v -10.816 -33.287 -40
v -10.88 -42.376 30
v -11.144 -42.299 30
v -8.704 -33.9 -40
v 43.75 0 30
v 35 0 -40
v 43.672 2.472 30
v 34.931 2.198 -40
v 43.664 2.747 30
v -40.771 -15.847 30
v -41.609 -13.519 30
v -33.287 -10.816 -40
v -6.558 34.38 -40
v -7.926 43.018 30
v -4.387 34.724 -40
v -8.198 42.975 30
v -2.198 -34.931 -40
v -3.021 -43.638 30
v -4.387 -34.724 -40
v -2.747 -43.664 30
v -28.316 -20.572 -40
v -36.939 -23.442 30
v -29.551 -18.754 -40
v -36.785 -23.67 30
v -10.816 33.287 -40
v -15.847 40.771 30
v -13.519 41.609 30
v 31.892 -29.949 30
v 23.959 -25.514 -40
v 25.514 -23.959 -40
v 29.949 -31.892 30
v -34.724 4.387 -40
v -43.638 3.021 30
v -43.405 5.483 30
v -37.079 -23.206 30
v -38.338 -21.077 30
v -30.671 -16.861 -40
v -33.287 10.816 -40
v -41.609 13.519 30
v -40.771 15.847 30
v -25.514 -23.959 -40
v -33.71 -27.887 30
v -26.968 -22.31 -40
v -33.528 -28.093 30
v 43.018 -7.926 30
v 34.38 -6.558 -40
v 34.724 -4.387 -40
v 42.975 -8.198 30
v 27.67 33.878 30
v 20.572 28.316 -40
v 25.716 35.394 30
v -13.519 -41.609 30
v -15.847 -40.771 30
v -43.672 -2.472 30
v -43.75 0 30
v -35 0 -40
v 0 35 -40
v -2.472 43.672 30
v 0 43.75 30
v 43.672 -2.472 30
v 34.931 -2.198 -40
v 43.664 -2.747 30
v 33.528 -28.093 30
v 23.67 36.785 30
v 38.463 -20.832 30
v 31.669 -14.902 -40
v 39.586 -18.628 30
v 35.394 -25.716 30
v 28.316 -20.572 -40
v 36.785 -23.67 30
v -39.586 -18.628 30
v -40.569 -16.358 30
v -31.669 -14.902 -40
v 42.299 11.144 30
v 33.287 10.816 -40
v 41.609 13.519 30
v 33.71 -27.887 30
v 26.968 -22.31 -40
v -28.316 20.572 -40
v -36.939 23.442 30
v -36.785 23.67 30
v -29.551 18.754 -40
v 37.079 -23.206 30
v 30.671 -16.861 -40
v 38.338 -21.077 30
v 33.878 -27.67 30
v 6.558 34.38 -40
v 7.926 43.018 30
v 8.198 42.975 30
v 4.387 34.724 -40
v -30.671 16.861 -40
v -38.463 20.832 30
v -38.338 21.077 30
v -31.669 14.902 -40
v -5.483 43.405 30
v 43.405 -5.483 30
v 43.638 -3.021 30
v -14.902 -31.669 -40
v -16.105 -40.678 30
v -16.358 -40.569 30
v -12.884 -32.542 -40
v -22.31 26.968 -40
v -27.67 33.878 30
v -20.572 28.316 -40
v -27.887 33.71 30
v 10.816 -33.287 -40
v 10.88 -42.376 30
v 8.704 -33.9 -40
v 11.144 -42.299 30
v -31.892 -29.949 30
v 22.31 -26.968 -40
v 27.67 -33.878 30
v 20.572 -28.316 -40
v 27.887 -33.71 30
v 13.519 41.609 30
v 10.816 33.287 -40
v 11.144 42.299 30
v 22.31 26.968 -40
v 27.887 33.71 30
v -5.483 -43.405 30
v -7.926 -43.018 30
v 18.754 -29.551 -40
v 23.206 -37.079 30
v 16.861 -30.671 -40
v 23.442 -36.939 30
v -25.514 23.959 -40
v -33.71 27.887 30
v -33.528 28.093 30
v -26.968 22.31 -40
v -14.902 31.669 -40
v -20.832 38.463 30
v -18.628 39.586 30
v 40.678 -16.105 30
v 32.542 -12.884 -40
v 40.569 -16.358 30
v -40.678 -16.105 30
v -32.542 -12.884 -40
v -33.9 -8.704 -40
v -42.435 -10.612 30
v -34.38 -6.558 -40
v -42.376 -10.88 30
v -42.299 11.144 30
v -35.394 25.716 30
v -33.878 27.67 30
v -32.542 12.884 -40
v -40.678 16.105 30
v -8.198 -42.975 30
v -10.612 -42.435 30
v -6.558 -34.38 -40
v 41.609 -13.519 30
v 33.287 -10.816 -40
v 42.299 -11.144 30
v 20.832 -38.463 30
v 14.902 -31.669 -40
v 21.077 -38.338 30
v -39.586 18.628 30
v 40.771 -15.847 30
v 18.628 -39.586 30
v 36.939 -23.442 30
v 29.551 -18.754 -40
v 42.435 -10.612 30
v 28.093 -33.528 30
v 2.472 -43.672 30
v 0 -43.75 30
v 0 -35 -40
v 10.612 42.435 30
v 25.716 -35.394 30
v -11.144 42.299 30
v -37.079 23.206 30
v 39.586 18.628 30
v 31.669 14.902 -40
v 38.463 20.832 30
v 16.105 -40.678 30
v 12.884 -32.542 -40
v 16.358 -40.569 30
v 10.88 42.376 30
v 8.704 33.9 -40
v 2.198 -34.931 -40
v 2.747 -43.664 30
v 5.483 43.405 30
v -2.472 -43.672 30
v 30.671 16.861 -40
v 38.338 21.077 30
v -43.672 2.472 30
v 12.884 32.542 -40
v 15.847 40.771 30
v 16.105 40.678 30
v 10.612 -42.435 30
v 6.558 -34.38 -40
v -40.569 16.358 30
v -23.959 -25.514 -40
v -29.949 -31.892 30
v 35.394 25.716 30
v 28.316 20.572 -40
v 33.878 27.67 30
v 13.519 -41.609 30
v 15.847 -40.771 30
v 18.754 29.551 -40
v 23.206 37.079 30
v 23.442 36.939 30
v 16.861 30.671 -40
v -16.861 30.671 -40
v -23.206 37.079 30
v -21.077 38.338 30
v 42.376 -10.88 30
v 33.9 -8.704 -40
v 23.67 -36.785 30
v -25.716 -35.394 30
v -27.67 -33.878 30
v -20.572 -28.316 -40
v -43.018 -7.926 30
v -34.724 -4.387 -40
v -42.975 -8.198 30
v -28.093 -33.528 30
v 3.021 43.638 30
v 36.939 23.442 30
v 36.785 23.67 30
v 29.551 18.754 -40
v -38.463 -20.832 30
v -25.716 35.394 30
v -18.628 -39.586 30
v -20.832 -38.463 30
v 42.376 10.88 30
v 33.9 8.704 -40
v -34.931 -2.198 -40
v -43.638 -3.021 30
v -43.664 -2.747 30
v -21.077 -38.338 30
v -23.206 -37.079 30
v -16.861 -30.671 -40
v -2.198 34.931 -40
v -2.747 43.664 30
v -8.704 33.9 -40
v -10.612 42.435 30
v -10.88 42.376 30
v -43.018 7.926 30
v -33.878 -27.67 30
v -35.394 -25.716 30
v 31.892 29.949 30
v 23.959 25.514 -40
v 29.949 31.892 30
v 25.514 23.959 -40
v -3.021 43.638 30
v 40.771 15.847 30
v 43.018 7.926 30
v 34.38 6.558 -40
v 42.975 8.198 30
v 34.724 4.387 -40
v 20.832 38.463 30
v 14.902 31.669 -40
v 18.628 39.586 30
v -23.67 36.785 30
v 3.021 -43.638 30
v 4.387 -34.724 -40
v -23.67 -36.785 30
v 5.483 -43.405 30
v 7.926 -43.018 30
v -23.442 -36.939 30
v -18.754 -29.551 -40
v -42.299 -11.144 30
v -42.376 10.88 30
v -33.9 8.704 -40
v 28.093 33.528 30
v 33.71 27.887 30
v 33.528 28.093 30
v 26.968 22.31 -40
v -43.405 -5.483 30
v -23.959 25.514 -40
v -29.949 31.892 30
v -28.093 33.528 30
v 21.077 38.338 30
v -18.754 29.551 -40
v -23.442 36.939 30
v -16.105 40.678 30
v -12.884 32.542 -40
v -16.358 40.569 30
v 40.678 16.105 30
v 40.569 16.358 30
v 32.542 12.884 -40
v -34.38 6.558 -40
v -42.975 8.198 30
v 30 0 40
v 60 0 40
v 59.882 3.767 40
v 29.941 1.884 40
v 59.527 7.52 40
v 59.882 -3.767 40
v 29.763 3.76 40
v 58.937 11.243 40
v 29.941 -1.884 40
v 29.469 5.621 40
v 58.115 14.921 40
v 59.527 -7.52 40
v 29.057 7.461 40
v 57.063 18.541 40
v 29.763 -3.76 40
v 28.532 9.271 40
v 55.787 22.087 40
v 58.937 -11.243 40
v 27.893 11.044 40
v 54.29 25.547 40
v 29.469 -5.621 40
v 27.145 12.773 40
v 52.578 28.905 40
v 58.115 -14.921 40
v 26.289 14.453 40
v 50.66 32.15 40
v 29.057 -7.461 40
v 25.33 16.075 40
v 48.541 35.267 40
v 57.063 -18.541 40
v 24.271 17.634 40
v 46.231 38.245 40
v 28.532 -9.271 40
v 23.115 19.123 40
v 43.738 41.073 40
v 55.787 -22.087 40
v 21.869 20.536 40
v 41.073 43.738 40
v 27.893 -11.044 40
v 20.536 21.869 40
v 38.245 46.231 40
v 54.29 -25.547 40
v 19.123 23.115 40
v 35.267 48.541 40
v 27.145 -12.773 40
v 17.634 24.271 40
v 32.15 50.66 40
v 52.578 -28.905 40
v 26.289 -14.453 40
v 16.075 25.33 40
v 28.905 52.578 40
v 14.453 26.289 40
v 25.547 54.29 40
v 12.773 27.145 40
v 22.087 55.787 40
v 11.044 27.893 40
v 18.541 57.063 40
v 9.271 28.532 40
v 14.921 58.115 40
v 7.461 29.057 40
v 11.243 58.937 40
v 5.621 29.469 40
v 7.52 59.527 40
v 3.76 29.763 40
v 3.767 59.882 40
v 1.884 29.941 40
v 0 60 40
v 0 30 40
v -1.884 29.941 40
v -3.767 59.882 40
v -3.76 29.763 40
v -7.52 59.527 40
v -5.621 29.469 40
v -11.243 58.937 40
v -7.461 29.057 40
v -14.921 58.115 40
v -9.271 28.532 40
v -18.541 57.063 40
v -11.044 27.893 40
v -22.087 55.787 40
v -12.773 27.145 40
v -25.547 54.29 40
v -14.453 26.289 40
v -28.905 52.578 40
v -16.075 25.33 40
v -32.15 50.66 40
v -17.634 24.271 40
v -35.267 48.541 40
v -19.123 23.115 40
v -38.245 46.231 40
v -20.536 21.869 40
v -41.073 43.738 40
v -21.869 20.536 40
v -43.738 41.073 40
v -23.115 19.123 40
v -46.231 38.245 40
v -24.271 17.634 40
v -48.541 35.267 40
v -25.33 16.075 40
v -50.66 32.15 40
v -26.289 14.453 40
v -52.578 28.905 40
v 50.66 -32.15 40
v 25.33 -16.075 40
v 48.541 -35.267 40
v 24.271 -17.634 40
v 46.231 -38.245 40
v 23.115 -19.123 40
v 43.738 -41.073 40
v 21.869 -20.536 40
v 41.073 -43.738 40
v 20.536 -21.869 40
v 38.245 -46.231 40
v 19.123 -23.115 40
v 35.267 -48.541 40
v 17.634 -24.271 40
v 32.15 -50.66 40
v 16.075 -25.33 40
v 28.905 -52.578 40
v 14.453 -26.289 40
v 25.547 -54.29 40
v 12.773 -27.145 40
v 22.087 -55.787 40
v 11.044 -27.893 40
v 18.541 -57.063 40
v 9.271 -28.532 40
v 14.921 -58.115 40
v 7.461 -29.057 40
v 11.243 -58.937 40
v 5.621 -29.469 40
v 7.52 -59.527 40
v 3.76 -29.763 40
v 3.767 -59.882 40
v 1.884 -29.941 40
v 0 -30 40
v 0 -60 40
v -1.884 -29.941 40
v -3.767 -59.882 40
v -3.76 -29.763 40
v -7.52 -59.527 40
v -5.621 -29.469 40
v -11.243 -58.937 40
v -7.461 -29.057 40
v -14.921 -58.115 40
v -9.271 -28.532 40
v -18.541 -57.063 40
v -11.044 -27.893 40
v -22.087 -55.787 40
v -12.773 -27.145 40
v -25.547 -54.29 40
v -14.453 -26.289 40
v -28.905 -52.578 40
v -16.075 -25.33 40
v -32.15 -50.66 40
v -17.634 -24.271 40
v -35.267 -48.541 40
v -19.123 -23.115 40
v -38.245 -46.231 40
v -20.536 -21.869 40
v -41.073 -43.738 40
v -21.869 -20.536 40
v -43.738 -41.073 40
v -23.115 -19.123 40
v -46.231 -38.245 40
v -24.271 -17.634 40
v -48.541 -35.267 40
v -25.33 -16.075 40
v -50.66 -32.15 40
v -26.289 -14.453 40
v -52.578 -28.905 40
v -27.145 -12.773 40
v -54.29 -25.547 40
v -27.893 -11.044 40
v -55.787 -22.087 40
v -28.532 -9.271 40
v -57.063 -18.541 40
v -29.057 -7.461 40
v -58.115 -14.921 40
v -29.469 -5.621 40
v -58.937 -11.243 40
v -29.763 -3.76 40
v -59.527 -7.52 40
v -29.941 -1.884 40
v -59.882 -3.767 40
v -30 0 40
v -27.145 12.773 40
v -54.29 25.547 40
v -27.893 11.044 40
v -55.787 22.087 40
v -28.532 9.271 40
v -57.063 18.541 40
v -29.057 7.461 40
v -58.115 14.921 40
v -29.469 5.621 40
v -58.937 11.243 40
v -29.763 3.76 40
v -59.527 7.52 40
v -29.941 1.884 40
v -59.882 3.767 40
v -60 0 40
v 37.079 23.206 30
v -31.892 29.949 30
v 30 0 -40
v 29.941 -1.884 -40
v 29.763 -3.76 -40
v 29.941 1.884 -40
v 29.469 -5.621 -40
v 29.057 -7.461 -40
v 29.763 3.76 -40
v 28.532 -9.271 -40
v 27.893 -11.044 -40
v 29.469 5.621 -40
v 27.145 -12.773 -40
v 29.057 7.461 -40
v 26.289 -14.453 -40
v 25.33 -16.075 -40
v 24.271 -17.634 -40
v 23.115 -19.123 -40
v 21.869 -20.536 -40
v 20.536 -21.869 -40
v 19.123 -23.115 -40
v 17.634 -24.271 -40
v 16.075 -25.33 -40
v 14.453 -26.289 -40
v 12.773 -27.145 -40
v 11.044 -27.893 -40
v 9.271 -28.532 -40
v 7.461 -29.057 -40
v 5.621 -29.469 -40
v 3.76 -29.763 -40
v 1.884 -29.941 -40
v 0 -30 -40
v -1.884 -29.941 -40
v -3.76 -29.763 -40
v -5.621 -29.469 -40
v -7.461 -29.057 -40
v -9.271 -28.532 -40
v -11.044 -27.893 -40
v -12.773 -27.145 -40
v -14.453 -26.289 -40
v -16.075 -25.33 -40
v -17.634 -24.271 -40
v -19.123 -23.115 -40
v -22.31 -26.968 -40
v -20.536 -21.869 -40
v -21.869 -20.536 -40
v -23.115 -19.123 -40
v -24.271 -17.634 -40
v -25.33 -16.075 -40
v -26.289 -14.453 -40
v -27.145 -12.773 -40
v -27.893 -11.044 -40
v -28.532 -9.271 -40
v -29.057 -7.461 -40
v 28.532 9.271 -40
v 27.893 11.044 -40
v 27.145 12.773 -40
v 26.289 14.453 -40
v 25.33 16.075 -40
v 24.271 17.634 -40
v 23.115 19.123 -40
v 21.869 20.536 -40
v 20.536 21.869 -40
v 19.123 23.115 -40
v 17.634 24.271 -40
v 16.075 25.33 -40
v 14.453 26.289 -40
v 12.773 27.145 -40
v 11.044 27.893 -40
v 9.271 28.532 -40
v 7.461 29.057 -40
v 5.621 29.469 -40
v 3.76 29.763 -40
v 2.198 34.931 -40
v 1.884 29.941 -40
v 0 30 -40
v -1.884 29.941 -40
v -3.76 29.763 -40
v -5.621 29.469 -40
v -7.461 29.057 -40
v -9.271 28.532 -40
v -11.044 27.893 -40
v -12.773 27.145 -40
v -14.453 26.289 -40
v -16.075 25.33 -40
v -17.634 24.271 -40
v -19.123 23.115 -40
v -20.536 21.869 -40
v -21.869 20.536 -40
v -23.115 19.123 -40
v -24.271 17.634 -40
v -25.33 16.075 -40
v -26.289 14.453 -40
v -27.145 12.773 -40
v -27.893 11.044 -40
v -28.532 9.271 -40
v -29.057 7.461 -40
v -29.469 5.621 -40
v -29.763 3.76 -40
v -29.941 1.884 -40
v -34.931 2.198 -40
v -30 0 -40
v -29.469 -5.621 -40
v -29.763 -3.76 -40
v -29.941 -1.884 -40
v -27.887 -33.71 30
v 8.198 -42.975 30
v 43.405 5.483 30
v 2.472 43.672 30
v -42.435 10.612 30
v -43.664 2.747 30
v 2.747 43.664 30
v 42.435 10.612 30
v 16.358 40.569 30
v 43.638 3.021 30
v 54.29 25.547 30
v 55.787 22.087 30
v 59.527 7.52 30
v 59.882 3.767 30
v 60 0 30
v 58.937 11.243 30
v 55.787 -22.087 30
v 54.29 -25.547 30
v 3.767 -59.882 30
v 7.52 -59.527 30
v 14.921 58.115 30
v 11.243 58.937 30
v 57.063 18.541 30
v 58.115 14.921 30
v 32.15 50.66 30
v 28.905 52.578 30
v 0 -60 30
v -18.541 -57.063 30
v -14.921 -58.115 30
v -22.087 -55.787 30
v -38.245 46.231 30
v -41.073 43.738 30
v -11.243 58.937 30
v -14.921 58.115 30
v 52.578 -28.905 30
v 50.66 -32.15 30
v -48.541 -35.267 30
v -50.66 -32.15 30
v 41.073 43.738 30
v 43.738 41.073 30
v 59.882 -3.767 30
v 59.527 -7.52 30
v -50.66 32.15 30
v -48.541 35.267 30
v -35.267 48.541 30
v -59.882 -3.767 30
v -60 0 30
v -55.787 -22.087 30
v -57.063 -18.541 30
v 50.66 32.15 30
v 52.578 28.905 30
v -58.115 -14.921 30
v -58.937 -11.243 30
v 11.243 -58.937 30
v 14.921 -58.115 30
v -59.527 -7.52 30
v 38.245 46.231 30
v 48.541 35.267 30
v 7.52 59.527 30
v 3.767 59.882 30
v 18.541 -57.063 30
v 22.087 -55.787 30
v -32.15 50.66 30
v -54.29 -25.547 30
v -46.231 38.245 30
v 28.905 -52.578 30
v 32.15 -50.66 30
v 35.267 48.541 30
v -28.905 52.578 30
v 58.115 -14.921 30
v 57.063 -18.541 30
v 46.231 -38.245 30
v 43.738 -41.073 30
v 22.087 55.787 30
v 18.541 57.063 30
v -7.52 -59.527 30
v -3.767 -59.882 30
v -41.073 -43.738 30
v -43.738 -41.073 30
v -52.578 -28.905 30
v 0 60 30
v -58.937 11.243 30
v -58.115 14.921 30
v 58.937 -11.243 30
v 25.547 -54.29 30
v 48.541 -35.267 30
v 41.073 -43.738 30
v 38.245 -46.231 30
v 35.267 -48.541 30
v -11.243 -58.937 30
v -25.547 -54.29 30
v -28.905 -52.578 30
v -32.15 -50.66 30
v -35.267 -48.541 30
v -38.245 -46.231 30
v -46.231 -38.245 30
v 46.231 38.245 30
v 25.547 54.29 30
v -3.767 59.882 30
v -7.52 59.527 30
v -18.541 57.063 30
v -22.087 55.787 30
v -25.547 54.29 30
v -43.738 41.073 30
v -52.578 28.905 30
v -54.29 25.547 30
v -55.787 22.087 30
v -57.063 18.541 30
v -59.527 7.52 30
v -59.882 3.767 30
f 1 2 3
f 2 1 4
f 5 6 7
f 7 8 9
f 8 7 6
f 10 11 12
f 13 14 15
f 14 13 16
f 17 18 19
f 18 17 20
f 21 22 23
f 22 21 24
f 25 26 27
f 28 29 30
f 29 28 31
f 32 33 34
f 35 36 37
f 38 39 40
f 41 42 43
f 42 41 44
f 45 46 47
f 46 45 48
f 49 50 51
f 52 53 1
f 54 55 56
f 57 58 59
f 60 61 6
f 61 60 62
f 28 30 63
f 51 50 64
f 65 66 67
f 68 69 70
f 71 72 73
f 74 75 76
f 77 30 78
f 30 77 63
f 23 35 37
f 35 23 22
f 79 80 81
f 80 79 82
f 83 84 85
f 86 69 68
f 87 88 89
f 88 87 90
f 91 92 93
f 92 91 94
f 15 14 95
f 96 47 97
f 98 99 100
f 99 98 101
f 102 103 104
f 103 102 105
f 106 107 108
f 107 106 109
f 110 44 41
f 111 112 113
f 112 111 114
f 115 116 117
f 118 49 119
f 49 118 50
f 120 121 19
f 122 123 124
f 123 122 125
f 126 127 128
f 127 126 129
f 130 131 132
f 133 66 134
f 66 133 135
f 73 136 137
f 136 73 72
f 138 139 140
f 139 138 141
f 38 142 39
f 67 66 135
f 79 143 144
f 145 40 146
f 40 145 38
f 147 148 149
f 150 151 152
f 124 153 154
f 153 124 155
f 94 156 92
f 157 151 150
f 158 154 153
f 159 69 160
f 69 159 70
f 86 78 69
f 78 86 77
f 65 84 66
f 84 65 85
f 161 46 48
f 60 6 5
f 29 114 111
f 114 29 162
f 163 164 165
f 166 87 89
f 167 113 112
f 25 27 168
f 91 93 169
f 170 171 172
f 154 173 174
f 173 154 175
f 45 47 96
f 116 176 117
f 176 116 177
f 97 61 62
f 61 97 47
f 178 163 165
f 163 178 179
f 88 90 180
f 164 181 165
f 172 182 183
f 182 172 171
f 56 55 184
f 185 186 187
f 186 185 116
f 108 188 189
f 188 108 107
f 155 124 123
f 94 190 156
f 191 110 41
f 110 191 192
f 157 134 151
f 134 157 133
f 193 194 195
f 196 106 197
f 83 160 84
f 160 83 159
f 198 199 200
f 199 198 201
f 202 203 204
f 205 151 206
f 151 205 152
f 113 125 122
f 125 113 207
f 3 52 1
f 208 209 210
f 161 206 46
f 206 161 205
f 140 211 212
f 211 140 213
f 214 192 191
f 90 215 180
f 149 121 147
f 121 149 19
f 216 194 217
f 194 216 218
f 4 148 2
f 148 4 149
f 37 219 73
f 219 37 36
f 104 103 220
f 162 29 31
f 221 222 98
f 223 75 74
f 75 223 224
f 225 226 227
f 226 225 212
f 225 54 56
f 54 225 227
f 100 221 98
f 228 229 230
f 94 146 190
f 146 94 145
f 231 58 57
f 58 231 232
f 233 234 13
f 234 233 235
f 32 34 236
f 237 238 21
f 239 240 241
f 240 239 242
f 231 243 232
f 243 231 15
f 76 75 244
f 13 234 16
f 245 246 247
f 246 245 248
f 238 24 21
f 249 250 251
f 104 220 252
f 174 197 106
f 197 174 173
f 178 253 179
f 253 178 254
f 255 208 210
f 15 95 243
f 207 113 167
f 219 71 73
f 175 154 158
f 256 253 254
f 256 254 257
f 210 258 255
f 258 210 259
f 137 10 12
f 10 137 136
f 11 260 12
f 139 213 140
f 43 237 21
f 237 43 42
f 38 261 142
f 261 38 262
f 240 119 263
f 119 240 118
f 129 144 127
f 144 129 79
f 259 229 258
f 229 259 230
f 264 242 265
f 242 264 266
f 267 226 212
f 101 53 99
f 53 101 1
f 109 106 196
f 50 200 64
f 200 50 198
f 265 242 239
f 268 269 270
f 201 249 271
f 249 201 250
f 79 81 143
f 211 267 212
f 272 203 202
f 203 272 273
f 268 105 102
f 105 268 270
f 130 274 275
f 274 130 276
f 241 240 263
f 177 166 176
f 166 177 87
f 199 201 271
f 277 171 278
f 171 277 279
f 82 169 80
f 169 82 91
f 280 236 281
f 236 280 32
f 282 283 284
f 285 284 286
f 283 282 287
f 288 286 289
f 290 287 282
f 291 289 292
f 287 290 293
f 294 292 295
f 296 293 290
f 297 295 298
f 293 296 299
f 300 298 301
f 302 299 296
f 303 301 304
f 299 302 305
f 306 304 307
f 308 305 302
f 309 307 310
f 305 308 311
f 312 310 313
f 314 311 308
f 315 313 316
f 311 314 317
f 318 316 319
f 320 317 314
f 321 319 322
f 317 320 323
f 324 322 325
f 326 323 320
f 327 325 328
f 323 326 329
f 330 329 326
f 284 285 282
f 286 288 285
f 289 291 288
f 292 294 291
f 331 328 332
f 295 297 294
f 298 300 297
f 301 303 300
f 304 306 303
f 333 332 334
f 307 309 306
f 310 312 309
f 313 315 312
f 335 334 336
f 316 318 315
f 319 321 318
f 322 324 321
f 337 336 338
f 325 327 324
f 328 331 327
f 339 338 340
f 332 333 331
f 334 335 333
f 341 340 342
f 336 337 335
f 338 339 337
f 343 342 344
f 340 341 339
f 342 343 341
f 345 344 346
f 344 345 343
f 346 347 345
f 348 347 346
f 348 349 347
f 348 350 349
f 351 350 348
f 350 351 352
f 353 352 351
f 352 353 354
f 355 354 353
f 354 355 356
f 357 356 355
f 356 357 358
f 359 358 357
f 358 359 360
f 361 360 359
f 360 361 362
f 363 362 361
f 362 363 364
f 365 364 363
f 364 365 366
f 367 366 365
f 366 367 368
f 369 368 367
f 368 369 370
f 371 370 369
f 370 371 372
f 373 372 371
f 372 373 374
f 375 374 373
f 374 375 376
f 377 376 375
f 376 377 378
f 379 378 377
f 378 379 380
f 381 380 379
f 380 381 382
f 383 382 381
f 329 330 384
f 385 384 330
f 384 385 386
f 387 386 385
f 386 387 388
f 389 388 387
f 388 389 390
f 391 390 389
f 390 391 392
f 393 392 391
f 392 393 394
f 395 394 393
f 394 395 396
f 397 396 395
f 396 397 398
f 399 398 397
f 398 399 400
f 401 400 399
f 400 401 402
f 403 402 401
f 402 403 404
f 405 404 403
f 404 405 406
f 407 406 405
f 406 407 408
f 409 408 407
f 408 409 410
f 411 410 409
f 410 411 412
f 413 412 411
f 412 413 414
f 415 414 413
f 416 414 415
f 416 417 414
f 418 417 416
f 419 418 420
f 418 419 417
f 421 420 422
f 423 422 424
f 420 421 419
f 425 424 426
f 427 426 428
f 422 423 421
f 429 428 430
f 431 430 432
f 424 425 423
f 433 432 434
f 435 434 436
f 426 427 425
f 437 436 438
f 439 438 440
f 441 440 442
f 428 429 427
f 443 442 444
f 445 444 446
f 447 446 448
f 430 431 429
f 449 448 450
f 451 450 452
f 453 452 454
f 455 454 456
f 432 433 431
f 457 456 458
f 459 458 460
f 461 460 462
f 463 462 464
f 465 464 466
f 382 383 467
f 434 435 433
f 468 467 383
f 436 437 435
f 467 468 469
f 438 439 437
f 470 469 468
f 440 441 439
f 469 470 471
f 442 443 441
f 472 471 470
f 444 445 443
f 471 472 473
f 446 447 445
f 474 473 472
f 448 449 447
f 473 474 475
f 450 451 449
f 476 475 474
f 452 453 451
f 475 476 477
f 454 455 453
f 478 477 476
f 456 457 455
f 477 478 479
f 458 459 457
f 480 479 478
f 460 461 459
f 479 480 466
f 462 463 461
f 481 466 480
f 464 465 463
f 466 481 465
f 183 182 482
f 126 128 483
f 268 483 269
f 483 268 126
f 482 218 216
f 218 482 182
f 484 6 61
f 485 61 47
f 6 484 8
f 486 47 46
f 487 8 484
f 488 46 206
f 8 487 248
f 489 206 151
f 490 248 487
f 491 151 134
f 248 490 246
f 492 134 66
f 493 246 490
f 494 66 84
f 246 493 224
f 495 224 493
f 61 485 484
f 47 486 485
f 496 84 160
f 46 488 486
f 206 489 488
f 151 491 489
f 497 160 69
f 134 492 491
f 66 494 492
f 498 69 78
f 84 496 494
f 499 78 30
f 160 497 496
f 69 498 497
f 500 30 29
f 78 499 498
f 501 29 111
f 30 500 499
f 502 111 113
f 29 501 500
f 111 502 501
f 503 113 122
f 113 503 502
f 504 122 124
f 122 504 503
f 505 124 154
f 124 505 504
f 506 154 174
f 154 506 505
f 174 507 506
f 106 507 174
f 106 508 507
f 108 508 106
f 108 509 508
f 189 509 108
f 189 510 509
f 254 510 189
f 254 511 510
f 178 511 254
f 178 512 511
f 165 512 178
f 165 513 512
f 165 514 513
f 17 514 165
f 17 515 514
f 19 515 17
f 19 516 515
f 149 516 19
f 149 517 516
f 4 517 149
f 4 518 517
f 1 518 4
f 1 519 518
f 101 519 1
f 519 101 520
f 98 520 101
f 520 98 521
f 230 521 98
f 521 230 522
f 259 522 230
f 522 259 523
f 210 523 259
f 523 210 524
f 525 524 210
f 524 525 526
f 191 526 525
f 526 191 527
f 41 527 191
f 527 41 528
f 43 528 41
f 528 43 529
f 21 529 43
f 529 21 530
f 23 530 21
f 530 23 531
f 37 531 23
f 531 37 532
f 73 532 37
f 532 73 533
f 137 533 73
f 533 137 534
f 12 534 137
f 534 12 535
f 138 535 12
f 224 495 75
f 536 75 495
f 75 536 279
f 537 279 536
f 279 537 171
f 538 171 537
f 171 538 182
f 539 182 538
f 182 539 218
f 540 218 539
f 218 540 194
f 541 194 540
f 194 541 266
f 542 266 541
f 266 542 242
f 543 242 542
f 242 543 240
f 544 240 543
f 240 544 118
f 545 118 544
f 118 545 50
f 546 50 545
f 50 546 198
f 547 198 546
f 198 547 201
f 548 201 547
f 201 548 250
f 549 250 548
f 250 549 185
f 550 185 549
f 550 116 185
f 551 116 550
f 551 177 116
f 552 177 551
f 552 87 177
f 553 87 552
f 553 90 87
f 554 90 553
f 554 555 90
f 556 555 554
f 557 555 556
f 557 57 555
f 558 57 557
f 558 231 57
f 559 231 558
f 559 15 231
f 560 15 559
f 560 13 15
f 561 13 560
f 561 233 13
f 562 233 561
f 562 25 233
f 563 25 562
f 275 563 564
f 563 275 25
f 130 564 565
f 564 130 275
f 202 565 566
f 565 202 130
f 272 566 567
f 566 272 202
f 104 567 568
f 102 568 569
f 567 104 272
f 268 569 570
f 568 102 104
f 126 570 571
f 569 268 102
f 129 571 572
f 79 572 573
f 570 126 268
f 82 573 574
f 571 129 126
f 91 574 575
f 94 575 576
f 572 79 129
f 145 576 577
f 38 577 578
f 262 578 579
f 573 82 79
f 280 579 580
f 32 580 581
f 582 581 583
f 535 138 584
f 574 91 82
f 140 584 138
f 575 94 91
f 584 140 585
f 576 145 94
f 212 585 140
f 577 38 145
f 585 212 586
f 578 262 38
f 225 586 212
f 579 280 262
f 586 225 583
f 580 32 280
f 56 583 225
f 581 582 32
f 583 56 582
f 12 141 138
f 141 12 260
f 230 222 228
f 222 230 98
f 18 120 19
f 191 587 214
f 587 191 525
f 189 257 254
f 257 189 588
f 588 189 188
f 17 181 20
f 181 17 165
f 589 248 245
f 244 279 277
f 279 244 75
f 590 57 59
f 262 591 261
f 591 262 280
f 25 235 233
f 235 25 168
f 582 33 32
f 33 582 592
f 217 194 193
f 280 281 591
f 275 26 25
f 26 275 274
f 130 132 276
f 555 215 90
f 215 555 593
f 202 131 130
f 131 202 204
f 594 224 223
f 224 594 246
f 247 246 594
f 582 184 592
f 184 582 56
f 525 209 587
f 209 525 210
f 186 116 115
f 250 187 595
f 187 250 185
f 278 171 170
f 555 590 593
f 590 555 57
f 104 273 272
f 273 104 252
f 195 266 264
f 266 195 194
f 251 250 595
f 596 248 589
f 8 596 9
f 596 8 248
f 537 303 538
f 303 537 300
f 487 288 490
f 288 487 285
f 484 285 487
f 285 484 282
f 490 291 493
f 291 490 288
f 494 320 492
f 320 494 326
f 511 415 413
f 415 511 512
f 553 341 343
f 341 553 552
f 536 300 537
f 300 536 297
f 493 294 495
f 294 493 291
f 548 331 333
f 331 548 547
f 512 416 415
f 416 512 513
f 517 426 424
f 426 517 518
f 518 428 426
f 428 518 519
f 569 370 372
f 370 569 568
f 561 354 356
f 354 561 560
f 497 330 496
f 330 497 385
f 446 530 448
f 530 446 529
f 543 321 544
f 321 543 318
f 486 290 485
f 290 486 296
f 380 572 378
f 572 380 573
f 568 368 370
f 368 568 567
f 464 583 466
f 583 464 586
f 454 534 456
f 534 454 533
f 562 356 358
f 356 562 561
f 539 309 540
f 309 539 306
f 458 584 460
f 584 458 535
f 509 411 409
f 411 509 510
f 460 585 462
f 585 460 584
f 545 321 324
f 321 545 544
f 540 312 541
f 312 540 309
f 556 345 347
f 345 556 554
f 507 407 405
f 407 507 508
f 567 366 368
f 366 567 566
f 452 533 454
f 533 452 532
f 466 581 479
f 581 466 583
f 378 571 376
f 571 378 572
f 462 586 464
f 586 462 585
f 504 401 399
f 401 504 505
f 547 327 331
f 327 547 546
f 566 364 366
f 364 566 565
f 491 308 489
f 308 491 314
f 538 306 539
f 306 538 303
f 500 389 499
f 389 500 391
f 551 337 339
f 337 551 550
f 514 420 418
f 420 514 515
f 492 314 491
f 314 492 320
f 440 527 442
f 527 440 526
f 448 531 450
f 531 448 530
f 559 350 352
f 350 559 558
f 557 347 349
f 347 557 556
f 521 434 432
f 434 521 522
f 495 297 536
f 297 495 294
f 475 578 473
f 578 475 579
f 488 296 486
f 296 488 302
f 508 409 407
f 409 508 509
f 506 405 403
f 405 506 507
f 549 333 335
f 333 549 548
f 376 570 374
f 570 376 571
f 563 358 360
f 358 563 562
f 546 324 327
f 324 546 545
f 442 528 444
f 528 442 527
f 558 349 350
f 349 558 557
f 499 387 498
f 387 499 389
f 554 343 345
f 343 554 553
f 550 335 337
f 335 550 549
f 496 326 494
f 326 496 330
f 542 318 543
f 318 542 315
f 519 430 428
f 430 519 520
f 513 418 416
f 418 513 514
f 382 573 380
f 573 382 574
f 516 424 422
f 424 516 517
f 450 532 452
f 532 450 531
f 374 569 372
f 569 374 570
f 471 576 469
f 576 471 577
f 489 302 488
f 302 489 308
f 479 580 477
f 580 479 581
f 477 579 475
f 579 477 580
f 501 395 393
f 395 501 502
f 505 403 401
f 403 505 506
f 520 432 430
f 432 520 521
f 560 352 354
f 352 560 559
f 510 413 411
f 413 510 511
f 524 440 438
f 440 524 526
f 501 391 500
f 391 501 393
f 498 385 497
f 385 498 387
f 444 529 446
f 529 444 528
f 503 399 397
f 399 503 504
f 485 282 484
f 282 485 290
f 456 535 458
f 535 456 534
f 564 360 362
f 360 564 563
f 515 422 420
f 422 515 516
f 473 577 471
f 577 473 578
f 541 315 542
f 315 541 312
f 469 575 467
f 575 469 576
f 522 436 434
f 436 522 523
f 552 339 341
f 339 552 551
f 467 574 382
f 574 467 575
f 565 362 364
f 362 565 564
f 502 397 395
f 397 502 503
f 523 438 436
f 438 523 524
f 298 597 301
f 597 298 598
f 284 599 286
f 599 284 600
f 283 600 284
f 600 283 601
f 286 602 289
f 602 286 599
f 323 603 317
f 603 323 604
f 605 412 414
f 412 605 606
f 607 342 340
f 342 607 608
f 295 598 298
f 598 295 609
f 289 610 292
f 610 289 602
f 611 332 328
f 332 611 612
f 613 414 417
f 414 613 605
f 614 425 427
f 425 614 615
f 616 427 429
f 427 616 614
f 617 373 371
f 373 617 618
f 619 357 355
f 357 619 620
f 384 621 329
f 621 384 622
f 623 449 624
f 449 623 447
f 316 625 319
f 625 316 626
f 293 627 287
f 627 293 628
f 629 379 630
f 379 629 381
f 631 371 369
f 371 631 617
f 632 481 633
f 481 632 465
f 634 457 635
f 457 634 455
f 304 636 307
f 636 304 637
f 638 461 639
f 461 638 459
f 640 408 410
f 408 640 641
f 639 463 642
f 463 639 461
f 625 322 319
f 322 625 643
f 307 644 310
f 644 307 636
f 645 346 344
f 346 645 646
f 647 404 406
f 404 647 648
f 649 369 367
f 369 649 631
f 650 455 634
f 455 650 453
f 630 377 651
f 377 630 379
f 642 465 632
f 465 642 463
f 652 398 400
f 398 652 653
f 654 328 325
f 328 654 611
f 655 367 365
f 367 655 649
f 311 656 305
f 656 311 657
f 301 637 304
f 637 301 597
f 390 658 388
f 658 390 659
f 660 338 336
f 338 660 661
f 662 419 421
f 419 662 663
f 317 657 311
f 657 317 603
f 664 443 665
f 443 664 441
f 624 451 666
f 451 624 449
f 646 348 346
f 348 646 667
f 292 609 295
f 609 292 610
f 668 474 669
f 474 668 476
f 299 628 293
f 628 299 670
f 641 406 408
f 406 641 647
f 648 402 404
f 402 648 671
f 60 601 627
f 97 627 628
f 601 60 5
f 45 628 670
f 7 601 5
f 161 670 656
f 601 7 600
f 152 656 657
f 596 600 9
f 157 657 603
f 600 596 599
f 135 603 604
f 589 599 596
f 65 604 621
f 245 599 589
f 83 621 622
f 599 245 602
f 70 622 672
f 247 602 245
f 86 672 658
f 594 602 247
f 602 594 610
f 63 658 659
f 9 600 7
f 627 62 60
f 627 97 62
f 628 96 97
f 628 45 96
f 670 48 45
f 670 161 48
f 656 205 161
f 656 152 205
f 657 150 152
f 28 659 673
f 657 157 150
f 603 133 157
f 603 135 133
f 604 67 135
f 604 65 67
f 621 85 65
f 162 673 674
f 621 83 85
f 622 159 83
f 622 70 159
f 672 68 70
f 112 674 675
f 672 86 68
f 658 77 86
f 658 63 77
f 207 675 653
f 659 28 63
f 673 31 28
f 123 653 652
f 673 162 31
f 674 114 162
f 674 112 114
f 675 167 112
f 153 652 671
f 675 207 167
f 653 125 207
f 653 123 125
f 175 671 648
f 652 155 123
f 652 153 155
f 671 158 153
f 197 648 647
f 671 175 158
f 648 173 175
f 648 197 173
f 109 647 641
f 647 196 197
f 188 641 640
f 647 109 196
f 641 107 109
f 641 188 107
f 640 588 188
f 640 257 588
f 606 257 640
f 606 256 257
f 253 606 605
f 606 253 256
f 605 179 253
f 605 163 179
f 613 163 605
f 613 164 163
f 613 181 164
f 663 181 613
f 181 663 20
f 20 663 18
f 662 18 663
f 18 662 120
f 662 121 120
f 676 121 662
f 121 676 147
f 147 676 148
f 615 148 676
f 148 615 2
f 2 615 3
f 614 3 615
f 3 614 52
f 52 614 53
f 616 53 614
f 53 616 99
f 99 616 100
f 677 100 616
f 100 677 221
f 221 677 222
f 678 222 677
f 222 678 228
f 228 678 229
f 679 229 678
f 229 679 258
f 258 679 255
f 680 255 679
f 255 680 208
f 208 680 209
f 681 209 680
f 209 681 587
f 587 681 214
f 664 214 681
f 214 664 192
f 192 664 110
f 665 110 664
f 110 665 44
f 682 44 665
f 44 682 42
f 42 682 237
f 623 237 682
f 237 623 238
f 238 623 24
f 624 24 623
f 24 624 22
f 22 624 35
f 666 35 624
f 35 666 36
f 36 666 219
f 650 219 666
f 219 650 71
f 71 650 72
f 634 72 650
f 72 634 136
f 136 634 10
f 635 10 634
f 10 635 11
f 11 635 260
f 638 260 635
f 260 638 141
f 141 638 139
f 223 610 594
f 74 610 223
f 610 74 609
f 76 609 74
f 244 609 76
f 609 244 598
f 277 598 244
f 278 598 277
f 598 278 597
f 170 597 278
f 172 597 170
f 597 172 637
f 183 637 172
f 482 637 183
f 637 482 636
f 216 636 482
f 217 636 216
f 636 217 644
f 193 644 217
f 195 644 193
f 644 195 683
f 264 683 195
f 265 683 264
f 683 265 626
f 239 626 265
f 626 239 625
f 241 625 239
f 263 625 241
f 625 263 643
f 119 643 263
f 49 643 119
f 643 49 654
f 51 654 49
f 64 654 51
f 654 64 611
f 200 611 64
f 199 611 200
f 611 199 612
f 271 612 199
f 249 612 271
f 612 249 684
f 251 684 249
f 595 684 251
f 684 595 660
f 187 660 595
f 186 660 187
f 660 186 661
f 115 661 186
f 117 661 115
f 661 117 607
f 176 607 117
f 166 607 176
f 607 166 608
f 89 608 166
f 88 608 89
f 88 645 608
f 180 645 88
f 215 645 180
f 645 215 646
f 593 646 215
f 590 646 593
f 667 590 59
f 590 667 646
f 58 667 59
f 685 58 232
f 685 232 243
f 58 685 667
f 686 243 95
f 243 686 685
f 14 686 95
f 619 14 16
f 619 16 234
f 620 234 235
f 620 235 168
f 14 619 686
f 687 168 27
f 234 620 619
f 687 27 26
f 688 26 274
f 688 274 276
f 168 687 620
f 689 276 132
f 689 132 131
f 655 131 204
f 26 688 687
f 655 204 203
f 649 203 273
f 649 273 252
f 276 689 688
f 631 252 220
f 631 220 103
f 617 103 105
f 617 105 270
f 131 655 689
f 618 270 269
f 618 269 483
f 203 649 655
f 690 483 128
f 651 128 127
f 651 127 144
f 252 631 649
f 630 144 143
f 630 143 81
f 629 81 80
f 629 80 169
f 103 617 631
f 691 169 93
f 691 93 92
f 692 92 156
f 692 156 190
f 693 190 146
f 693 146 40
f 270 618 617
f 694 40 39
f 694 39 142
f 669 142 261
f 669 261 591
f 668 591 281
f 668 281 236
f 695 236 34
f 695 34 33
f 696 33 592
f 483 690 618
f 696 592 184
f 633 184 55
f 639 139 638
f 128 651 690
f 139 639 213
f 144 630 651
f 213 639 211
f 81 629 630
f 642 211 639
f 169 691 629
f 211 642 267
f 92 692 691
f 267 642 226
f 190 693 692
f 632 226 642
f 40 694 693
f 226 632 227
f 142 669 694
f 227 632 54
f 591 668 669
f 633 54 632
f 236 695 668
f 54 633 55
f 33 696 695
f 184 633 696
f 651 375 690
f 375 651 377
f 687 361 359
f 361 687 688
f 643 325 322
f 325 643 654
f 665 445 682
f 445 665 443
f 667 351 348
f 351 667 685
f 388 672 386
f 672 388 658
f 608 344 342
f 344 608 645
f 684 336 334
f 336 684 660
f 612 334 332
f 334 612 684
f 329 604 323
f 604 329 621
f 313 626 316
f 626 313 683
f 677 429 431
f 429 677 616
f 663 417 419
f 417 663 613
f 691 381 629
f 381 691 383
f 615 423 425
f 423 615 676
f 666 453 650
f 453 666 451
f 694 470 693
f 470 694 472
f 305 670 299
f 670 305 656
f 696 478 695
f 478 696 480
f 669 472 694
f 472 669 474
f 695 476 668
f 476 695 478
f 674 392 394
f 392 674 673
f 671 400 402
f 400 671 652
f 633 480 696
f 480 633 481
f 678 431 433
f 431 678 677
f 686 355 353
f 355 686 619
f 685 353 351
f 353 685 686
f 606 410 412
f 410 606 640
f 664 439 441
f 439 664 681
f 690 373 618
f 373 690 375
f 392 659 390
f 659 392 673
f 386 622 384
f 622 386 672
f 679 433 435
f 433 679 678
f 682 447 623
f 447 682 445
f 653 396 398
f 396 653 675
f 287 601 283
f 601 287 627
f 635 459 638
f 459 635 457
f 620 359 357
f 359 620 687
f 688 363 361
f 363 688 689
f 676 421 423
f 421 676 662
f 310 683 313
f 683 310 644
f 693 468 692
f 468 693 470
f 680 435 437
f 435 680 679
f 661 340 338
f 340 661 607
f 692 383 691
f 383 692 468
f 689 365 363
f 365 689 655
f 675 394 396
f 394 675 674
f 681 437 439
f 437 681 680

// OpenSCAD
poly_n = 40;
$fn=100;
// cylinder(40,60,80,$fn=150);
// cylinder(40,60,80,$fn=150);
// # cylinder(h=40,70,80);

difference(){
    cylinder(80,35,45, center=true);
    cylinder(82,30,30,center=true);
 }

difference(){
    translate([0,0,35]) {
        cylinder(10,60,60, center=true);
    }
    cylinder(82,30,30,center=true);
}
